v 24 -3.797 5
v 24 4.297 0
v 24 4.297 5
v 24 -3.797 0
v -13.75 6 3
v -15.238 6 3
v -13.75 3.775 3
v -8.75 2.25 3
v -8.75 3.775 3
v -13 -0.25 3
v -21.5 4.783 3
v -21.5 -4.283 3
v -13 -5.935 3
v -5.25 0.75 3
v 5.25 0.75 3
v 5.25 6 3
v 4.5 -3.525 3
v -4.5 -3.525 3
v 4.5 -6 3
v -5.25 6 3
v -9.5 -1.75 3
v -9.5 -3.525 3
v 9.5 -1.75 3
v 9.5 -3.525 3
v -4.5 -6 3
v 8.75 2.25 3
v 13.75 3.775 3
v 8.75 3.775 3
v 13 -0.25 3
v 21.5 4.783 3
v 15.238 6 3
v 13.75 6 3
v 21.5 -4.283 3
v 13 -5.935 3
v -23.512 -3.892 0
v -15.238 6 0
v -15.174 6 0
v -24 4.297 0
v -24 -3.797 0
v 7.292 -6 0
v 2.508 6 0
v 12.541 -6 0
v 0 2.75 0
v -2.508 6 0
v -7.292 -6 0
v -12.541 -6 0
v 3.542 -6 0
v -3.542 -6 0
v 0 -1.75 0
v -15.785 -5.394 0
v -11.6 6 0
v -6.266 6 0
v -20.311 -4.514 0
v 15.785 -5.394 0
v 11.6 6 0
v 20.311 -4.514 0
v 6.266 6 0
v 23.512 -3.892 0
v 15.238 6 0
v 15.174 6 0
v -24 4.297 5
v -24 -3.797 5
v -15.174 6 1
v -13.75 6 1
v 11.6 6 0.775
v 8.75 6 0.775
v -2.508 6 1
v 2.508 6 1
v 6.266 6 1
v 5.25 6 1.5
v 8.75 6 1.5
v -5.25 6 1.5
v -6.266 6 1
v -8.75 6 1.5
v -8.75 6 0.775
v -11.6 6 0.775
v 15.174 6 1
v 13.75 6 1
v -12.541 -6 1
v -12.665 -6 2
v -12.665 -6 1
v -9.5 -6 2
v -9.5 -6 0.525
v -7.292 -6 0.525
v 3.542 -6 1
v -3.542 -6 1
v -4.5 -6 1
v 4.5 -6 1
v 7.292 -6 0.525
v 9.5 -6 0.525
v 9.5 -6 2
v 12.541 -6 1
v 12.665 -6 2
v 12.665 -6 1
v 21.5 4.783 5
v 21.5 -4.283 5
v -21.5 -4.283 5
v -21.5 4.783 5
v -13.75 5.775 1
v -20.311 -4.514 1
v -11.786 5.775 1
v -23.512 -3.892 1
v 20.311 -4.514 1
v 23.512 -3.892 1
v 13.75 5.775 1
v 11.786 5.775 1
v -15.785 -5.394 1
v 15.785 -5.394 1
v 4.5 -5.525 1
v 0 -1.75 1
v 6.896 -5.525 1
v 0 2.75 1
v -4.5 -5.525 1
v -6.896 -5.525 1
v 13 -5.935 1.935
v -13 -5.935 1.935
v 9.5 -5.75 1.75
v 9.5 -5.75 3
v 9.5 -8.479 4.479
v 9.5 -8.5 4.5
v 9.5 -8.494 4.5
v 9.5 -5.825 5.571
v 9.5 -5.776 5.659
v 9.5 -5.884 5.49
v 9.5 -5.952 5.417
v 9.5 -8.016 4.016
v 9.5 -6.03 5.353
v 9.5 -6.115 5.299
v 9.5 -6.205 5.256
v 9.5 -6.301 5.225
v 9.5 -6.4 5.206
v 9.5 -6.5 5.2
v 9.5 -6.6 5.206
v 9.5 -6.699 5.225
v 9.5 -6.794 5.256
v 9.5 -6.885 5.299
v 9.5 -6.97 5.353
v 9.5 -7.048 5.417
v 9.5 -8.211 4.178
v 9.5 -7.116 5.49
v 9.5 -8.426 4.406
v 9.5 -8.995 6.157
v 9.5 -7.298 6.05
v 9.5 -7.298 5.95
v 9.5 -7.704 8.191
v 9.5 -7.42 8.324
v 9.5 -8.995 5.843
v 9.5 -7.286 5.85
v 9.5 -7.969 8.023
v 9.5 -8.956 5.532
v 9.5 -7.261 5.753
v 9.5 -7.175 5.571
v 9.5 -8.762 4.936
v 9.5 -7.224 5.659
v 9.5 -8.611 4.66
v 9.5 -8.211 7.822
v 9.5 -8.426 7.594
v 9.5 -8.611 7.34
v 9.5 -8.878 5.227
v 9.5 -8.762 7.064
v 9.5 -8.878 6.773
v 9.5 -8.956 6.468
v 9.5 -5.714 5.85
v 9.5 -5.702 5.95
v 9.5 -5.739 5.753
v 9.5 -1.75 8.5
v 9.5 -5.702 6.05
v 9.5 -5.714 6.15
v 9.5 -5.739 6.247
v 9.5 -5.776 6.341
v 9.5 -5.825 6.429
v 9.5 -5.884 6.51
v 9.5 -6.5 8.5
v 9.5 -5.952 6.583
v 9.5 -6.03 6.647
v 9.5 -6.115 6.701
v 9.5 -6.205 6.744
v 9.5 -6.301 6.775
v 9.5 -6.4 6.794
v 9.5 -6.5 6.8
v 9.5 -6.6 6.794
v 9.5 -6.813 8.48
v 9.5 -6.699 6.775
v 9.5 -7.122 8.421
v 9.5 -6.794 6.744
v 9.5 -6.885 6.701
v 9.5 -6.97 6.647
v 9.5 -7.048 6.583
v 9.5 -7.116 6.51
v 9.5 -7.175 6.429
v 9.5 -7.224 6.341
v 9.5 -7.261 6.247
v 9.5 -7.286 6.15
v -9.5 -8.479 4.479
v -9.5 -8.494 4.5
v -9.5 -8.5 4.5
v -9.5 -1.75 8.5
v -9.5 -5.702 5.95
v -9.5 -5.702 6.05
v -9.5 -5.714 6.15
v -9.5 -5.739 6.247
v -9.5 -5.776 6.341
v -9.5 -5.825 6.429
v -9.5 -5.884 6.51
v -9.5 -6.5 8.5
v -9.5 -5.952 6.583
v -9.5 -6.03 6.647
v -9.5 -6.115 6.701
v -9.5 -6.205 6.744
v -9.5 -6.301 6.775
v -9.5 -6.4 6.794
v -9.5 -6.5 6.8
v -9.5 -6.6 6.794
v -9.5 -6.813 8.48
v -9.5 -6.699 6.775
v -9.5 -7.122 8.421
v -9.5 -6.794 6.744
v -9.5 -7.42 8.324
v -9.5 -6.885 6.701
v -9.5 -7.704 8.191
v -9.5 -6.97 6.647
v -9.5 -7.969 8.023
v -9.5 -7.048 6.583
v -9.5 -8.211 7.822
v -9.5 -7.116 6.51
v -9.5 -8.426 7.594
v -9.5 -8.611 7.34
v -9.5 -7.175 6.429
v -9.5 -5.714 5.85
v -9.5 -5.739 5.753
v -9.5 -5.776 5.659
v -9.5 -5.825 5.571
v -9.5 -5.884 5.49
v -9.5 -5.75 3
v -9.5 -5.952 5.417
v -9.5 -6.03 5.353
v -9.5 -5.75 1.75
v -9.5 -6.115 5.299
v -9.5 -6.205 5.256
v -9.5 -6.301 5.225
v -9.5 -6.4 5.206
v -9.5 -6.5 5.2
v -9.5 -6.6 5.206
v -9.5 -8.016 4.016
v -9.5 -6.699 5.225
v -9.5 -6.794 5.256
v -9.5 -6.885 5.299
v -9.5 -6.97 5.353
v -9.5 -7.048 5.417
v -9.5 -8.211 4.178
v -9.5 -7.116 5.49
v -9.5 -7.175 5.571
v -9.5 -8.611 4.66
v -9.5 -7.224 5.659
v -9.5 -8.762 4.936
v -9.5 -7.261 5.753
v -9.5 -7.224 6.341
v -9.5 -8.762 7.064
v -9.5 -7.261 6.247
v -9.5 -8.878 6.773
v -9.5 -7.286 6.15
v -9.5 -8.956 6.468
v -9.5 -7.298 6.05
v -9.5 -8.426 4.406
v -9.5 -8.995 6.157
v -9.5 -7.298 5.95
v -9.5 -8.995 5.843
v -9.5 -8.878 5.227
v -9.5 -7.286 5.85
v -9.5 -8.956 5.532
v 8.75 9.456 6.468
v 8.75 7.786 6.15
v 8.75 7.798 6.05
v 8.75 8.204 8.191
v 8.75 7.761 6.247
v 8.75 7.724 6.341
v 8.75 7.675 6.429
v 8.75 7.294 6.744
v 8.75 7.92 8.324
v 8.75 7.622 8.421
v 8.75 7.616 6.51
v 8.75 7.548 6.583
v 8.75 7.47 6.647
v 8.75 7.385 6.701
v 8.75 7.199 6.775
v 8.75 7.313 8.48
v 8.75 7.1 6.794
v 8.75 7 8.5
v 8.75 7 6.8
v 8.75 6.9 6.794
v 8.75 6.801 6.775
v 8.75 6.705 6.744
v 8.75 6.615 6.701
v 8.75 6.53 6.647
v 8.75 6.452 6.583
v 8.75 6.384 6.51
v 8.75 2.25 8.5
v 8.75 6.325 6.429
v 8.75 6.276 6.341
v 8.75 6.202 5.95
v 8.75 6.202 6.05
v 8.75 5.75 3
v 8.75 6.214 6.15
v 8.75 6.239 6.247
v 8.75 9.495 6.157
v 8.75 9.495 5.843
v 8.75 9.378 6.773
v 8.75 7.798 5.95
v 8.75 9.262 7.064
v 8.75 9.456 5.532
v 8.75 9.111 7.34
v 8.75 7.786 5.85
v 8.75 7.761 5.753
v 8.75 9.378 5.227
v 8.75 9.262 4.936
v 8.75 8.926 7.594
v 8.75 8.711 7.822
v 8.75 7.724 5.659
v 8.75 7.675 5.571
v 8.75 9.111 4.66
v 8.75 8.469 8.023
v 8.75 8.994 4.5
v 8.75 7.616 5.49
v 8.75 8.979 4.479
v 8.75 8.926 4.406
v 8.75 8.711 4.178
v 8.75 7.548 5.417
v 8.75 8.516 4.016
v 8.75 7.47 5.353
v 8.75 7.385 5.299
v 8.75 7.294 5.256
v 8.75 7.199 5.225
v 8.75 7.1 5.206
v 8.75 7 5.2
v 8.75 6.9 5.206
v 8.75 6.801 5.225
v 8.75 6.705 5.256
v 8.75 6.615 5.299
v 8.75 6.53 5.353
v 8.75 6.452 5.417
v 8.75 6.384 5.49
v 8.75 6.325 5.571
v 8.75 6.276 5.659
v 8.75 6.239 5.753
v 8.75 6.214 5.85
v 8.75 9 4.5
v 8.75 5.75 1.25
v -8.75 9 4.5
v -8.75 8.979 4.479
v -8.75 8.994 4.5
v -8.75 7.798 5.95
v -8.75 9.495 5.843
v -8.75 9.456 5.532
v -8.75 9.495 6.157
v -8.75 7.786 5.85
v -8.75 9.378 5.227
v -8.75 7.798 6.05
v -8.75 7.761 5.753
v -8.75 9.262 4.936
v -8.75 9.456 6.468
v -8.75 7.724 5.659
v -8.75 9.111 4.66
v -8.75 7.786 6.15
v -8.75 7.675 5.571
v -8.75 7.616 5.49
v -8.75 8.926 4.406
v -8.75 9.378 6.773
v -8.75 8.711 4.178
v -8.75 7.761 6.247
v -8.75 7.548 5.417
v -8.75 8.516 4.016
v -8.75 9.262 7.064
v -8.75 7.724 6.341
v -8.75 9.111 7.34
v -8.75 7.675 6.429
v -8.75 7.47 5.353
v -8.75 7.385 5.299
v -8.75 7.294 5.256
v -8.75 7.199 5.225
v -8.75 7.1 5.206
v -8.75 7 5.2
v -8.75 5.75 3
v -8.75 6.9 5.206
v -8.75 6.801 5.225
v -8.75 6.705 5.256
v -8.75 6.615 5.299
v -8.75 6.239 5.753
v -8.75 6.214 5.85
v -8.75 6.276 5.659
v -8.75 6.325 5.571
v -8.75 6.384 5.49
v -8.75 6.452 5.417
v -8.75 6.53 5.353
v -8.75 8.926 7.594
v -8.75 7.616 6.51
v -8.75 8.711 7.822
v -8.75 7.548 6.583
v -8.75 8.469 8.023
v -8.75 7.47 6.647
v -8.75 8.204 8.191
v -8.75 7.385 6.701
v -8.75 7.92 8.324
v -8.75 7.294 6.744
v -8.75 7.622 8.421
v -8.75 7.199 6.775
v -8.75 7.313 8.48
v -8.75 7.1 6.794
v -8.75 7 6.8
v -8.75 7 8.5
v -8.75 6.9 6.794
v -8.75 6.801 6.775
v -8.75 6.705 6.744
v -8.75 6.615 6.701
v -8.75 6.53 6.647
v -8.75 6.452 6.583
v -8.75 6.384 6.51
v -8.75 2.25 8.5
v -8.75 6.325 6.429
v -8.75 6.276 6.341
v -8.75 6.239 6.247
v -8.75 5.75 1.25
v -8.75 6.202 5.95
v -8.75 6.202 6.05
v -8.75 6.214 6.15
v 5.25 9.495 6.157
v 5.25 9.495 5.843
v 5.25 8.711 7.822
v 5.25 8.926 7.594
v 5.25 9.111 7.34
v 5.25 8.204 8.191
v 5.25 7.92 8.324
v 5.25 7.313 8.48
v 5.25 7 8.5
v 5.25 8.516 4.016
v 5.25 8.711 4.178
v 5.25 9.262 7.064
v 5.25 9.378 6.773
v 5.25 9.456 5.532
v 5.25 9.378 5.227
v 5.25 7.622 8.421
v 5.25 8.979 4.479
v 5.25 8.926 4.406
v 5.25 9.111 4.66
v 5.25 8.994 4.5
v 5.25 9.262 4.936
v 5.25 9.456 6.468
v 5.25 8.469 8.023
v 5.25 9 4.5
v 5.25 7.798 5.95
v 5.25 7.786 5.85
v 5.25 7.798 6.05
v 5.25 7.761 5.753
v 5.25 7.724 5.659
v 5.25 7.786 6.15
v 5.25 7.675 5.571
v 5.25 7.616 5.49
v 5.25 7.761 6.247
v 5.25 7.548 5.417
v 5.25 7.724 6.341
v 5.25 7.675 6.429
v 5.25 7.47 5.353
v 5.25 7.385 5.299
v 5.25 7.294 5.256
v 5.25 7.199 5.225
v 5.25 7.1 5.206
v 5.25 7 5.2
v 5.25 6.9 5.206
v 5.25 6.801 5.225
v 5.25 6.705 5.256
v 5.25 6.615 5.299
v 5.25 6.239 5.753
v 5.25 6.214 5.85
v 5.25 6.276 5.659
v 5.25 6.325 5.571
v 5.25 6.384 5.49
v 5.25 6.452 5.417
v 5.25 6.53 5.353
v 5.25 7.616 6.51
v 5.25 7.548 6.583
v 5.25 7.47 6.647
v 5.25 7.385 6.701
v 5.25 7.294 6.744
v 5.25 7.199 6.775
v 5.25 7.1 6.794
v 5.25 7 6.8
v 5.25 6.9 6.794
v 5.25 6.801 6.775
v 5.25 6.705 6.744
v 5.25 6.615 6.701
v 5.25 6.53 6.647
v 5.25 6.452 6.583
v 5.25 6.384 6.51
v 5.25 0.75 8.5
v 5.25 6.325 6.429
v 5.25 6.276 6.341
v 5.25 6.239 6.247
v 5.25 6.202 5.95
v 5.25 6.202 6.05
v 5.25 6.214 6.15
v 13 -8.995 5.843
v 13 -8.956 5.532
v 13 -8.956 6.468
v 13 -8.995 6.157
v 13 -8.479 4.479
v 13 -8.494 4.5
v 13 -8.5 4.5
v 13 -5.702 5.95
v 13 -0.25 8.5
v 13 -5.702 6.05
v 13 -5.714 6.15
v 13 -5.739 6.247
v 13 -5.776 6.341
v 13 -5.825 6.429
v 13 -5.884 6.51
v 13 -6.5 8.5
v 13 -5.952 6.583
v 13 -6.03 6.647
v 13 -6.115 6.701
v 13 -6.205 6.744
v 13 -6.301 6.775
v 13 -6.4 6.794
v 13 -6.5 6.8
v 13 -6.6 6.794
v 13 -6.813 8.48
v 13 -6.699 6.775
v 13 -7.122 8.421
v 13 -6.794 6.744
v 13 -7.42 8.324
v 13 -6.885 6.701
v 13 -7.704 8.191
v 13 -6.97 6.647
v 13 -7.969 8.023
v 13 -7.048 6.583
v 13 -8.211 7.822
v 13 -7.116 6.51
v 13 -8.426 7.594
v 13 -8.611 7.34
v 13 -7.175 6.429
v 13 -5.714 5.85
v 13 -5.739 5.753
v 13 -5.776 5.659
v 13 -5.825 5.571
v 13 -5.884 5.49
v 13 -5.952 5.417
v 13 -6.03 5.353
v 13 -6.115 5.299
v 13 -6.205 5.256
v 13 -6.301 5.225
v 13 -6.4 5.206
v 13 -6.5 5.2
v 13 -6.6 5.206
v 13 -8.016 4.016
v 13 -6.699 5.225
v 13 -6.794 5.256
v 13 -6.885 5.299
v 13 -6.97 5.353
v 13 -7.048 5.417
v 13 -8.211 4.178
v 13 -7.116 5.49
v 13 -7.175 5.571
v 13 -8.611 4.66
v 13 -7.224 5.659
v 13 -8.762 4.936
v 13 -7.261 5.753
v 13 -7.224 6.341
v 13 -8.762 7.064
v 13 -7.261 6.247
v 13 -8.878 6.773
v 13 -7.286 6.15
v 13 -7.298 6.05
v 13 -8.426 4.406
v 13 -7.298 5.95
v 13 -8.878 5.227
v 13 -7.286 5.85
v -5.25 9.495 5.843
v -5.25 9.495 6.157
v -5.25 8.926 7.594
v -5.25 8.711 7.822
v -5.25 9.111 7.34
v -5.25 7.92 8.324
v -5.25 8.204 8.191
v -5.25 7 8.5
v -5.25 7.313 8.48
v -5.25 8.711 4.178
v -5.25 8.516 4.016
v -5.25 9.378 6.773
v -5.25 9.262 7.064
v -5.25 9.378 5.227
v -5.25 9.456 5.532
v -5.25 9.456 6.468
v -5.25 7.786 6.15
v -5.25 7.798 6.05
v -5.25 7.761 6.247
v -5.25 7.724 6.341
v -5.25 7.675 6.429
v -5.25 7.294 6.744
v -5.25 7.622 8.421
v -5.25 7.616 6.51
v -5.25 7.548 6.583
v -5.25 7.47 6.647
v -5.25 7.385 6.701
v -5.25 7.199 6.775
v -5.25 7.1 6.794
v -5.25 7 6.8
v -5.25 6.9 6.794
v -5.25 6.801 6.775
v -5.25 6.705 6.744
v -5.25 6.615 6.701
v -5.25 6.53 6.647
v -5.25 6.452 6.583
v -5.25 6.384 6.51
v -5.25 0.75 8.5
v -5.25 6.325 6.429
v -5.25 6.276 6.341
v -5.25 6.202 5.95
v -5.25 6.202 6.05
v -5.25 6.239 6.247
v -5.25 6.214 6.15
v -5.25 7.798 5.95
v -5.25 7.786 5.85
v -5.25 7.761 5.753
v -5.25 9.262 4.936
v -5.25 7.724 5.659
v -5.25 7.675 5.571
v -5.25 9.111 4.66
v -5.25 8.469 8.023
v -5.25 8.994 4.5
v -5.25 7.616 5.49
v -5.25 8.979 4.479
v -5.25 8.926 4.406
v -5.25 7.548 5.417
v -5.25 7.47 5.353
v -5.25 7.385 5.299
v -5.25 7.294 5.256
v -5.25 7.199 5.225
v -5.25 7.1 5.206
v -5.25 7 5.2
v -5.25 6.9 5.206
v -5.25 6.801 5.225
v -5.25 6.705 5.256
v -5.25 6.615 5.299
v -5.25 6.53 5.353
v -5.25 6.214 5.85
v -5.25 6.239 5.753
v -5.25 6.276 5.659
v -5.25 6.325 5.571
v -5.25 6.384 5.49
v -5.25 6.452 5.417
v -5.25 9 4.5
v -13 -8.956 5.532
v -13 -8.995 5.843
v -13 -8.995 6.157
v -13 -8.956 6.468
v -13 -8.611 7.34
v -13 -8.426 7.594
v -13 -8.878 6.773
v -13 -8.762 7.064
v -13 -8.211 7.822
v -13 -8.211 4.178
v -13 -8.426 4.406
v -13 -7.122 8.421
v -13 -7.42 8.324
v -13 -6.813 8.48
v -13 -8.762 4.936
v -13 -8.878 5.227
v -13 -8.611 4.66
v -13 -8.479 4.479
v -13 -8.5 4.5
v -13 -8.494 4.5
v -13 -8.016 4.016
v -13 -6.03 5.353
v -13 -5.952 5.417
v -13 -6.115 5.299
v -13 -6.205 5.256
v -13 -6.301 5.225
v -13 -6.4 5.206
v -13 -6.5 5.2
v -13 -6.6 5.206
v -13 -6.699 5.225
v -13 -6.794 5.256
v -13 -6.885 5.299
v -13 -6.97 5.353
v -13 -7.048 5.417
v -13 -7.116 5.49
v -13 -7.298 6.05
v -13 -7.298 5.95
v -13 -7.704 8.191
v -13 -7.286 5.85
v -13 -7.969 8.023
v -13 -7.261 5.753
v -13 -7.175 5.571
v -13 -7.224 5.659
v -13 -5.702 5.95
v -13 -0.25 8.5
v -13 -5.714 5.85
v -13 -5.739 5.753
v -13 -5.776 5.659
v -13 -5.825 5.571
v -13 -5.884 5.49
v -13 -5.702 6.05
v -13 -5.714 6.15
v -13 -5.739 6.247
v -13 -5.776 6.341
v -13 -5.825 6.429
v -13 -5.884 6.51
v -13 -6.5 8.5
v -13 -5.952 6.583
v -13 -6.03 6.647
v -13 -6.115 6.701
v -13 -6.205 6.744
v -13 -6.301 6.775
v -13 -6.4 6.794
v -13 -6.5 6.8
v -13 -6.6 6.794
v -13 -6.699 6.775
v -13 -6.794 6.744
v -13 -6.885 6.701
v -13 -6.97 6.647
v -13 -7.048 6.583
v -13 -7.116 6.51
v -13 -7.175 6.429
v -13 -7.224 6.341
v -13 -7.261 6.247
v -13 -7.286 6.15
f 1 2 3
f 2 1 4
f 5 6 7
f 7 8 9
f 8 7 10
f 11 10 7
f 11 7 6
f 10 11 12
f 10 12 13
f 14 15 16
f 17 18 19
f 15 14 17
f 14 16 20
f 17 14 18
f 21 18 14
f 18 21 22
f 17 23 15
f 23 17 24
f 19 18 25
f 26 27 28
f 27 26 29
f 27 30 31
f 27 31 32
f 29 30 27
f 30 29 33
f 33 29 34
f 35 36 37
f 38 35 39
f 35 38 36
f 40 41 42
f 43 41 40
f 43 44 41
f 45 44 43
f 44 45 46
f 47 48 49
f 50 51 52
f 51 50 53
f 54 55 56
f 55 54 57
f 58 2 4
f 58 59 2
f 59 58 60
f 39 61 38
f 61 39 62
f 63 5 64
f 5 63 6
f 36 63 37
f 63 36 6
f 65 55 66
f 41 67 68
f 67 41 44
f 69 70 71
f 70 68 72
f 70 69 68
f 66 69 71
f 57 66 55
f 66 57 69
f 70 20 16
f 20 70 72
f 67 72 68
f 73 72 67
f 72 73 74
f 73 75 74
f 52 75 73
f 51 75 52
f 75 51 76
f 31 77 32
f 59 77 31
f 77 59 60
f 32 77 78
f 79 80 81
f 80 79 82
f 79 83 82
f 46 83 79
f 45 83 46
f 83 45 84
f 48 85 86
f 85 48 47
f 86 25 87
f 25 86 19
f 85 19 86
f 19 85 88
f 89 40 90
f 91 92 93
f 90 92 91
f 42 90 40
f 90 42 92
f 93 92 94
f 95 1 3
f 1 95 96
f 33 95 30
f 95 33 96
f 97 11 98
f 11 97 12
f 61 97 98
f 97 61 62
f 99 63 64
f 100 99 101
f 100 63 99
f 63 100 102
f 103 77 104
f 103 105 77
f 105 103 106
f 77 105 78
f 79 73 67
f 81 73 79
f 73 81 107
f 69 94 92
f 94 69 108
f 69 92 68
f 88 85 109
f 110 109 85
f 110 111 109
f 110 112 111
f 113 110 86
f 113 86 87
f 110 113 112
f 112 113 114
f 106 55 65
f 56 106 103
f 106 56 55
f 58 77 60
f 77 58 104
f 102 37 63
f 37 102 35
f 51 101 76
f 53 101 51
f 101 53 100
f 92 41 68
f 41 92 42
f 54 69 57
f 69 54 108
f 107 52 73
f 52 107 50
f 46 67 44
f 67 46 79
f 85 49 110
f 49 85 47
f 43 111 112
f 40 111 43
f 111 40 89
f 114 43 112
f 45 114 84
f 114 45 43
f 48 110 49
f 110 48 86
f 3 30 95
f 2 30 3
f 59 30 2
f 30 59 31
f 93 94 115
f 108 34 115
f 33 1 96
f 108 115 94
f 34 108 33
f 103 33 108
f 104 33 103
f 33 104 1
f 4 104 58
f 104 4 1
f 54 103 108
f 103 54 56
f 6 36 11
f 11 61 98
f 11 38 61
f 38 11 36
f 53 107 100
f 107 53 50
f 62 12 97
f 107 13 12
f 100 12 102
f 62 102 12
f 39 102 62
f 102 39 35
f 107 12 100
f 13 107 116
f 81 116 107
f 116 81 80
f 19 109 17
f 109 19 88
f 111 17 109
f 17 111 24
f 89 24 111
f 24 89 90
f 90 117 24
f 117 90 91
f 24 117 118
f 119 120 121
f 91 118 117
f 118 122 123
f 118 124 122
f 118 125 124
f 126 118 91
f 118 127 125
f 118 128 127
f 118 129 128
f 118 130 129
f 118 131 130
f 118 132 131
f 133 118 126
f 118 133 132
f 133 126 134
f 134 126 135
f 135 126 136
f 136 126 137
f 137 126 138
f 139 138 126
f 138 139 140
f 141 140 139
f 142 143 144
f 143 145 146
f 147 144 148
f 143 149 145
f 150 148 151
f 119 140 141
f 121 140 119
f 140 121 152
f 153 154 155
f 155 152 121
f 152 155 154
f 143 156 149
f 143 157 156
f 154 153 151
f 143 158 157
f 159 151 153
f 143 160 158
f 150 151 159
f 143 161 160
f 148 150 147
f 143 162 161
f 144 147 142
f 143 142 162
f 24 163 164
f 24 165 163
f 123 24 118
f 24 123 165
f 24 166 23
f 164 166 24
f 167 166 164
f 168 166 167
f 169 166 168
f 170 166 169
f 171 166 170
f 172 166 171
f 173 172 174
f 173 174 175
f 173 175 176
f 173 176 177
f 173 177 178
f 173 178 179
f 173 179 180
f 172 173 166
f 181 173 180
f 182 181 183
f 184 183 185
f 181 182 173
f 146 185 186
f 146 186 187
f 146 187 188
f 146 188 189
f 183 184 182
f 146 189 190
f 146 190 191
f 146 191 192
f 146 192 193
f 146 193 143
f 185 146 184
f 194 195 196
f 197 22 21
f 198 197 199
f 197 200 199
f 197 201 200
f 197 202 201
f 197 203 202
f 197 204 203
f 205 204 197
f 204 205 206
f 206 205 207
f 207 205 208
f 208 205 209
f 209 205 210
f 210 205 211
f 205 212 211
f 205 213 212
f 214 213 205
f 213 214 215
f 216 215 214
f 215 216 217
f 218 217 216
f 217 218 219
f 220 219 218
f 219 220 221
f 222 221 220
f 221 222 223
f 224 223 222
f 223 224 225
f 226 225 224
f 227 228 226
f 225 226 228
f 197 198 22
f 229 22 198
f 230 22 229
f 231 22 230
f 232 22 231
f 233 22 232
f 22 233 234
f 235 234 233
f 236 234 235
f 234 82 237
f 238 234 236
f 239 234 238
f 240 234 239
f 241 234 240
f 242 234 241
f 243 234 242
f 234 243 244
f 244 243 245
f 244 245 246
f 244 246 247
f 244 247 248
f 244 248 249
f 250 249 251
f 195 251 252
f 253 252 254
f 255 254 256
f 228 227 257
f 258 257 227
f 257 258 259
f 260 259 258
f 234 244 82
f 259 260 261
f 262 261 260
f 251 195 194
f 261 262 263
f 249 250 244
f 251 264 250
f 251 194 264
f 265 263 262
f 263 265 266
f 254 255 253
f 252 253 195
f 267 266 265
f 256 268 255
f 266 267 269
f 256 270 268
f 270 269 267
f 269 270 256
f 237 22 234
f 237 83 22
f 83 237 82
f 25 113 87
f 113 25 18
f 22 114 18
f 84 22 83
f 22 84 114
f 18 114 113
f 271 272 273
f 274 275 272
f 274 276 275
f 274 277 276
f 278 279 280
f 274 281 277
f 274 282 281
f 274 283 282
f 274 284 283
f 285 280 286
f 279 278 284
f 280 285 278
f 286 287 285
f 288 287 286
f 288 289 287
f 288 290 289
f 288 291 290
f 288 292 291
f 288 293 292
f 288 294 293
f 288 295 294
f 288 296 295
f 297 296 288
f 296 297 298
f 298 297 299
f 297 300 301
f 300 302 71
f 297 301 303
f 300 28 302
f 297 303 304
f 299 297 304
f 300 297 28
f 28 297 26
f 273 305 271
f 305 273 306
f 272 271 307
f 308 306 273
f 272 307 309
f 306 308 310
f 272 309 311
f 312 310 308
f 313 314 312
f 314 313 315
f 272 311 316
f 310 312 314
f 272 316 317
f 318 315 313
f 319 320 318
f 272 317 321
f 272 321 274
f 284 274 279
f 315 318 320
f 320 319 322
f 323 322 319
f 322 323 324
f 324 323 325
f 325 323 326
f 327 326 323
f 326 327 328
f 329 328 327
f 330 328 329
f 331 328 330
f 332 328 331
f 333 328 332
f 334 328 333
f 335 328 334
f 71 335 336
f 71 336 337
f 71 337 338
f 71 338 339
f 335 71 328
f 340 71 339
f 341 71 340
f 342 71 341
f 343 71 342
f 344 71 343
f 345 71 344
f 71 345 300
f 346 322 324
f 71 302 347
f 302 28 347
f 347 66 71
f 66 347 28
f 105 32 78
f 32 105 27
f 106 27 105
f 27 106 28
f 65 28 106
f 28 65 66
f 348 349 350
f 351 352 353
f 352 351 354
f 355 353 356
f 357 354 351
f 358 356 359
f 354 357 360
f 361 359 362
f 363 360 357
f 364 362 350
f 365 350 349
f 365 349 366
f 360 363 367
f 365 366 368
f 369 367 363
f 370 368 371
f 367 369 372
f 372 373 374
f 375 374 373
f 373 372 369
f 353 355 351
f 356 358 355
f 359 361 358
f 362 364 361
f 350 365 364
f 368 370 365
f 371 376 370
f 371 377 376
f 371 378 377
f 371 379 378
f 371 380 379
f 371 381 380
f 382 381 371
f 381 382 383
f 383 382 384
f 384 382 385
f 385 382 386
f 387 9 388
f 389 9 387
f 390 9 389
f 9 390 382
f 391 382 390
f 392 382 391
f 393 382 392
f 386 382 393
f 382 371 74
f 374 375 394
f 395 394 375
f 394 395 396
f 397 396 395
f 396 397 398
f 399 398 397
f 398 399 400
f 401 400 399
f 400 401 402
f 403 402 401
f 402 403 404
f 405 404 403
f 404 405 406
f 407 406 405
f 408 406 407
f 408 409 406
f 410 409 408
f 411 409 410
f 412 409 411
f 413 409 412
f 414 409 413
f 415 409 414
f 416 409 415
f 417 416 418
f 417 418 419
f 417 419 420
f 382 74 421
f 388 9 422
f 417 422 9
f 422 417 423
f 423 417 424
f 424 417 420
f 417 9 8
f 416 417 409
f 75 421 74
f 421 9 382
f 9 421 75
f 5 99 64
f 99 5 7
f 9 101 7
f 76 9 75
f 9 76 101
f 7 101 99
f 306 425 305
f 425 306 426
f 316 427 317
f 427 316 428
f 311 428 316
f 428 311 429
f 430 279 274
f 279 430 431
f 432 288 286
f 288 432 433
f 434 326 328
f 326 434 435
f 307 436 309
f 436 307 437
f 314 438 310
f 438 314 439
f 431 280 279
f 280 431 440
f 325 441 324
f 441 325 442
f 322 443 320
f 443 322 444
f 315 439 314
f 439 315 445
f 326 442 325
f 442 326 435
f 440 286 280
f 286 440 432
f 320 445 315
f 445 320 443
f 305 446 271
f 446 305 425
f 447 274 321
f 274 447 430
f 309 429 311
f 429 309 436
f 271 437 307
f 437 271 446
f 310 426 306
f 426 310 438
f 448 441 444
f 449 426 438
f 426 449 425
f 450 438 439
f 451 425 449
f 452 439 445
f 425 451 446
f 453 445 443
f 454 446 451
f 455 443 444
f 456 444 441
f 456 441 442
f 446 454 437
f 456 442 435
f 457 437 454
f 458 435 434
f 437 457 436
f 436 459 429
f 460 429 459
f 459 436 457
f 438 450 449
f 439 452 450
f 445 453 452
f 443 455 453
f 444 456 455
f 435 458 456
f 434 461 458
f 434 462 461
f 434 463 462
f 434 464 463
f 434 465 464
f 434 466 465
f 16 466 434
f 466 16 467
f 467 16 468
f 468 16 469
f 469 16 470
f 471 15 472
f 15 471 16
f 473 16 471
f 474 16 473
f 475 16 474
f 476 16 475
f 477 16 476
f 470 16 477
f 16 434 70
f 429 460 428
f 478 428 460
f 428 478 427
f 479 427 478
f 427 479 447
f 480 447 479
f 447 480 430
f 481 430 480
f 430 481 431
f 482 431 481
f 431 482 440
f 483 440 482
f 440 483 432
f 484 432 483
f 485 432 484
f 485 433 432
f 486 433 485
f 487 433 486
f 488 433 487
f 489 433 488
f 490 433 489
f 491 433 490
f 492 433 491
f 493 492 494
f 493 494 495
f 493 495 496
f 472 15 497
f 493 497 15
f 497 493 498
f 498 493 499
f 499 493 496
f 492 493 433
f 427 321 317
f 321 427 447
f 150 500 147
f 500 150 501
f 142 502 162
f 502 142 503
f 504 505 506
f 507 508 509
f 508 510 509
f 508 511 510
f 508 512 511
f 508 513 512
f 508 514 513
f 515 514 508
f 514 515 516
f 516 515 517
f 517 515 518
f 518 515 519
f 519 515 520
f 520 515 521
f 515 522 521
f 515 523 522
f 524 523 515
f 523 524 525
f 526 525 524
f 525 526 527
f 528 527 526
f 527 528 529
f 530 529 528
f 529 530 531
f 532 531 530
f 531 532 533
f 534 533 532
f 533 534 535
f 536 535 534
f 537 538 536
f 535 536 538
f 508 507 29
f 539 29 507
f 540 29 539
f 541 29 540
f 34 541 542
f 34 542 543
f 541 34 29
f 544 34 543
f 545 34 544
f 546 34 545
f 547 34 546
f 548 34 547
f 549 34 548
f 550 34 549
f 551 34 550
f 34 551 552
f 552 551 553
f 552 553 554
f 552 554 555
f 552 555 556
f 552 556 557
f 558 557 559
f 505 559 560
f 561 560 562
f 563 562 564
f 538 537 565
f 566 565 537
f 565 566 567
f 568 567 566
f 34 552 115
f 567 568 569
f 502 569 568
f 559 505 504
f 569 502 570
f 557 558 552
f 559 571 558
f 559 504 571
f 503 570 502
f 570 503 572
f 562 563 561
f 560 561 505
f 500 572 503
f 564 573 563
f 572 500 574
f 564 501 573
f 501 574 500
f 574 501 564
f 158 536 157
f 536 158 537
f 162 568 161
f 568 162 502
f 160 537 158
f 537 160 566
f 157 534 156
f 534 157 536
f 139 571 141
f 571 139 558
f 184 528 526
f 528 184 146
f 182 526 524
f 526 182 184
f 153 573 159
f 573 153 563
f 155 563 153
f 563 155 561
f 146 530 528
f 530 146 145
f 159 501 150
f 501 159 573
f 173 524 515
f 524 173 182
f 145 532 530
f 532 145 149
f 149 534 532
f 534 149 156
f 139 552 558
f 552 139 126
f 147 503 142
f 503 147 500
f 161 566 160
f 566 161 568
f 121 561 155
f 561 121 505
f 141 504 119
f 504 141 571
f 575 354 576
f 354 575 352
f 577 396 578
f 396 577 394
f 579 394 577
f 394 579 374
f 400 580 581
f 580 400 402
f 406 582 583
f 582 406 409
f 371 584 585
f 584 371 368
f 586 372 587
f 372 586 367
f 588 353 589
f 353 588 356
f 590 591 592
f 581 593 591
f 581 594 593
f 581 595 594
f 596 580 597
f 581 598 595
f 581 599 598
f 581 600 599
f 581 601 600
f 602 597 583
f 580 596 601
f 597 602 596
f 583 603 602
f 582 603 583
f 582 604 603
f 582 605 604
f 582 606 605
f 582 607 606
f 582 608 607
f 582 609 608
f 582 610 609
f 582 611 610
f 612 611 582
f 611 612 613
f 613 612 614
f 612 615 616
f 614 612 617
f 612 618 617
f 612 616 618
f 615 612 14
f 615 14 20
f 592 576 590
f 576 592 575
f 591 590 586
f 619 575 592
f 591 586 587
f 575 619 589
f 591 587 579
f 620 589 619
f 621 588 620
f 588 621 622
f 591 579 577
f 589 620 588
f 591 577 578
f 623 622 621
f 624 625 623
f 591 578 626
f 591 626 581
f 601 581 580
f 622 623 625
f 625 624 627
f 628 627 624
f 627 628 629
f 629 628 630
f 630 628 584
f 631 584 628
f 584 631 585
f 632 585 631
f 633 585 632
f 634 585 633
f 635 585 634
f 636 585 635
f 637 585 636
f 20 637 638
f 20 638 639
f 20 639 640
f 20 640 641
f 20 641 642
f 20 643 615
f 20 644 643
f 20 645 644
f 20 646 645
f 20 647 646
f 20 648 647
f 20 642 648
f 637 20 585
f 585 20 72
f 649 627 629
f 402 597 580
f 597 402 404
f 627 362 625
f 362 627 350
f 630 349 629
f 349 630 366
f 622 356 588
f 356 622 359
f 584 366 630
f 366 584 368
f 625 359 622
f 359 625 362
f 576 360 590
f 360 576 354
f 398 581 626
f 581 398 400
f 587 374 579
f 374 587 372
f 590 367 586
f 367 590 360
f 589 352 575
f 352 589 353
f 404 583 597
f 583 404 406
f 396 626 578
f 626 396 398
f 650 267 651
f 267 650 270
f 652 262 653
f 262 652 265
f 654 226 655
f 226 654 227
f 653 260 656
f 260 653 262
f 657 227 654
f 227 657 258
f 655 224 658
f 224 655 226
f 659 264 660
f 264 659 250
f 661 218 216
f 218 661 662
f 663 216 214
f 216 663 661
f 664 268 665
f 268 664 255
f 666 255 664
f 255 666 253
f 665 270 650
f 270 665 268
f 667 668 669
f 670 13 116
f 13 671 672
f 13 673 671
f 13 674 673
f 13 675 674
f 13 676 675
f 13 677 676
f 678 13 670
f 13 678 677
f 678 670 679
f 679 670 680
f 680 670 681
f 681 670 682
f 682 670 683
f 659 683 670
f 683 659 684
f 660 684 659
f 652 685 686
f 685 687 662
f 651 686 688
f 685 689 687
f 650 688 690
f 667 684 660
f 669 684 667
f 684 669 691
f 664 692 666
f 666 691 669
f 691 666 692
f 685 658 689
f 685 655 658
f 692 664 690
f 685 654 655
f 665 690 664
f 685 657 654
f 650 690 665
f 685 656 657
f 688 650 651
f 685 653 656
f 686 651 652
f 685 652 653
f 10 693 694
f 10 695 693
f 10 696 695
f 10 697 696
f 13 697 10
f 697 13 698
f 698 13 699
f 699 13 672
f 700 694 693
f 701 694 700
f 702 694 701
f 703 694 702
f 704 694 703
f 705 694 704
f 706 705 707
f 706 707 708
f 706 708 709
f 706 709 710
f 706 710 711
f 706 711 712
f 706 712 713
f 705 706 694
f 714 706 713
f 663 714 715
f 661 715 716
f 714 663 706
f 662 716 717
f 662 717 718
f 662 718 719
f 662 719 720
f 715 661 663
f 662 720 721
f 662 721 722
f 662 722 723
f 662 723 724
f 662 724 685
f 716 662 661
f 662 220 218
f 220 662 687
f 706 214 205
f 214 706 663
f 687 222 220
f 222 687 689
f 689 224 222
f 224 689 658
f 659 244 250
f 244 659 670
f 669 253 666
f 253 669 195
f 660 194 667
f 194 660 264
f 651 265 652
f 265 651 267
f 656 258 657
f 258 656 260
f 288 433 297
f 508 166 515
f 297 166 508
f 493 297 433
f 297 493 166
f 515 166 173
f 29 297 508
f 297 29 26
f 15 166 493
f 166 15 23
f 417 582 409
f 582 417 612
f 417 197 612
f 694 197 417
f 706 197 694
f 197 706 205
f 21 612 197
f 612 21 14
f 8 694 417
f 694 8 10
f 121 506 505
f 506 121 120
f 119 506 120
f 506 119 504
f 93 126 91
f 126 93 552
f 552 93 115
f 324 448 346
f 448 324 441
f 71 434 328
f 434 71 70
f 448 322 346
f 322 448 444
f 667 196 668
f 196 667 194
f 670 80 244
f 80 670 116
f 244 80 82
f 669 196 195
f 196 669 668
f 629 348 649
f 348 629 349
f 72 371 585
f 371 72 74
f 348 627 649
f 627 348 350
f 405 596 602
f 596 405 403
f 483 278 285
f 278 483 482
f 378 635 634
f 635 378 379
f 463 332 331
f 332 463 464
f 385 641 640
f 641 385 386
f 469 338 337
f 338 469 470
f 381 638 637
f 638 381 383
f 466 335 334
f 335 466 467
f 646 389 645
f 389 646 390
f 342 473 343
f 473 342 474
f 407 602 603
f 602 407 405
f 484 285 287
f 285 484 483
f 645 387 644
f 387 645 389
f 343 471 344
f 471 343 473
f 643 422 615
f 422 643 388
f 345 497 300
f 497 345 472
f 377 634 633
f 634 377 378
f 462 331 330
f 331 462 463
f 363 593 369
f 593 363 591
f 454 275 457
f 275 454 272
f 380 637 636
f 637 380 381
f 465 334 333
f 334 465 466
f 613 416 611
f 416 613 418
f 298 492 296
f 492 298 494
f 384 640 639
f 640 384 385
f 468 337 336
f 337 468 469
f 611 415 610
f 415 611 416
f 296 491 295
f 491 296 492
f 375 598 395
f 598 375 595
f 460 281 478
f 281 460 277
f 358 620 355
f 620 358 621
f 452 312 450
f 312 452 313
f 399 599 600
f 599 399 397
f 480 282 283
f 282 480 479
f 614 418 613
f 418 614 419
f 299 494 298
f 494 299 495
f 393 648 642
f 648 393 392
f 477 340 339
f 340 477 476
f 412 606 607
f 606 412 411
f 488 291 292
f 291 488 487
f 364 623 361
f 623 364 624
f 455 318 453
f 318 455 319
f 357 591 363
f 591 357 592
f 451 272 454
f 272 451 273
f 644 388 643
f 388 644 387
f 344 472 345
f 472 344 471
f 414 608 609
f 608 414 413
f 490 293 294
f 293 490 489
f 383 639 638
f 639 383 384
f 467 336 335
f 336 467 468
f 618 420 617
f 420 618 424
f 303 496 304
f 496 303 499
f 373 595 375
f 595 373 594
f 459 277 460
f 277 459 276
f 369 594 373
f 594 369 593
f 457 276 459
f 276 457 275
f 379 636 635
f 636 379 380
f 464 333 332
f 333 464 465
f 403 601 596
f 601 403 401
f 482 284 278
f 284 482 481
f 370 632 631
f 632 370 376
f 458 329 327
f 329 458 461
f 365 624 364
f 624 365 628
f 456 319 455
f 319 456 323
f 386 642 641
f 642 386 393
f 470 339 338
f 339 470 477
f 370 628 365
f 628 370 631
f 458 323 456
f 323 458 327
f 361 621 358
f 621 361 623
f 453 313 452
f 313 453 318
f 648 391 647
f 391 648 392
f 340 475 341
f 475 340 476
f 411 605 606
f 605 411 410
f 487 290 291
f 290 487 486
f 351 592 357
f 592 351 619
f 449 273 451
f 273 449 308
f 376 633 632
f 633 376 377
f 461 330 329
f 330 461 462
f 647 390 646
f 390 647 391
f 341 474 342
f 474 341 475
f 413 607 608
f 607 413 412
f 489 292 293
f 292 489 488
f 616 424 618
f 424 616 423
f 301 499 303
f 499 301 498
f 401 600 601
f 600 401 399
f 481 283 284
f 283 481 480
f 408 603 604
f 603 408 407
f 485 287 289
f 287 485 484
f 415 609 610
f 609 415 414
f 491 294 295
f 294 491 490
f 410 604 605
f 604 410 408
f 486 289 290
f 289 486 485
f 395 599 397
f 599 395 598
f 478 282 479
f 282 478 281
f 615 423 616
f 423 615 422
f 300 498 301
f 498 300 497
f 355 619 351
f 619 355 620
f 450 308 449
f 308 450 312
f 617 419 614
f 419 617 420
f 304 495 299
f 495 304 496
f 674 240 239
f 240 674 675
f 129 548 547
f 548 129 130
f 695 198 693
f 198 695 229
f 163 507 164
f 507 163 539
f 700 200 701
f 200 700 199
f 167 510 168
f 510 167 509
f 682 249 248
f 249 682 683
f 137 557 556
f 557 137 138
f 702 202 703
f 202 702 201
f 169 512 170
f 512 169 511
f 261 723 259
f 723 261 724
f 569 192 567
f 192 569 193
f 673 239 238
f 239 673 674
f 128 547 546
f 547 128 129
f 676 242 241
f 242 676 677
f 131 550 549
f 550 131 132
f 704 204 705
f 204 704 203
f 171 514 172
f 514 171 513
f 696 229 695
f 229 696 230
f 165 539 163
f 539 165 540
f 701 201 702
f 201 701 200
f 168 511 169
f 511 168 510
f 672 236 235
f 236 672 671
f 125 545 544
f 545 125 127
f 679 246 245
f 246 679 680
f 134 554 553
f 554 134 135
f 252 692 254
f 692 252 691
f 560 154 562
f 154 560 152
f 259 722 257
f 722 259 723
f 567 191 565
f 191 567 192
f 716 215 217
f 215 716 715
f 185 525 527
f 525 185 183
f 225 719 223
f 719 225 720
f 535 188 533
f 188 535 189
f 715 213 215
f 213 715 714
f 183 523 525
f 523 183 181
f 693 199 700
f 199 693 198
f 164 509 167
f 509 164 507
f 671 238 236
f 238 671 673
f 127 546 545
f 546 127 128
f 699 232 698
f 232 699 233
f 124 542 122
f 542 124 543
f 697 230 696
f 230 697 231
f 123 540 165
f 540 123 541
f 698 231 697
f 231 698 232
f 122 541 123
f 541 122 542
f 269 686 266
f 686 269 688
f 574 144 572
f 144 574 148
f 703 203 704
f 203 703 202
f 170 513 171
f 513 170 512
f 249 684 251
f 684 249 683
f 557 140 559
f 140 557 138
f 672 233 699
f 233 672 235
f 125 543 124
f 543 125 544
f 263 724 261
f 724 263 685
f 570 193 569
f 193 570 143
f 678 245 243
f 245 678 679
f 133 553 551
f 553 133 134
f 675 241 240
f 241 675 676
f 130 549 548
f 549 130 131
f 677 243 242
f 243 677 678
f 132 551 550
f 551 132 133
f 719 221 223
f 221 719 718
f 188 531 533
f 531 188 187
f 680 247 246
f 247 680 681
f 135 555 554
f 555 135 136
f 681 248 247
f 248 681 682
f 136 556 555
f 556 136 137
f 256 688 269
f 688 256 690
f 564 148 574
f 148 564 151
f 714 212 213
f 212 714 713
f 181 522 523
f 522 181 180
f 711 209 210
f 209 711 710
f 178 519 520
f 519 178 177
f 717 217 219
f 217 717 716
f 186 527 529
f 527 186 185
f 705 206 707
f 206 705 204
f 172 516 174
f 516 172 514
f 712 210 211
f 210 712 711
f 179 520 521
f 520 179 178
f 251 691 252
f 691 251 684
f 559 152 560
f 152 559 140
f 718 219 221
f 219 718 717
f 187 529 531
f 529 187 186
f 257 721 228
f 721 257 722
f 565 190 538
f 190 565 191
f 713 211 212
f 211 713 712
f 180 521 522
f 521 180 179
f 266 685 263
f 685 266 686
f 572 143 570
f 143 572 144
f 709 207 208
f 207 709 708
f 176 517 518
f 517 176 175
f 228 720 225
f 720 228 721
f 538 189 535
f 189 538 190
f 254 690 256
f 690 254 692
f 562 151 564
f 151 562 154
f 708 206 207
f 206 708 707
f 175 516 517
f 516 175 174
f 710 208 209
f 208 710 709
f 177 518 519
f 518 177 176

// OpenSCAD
//translate([-24,-9,0]) #import("tread.stl");
difference() {
union () {
difference() {
union() {
//Main foot
translate([0,0,1.5]) cube([48,12,3],center=true);
//lips
translate([22.75,0,4]) cube([2.5,12,2],center=true);
translate([-22.75,0,4]) cube([2.5,12,2],center=true);
}
translate([0,0,-0.5])linear_extrude(height=1.5) {
//Track pattern
polygon(points=[[-7.5,-6.25],[0,2.75],[7.5,-6.25],[3.75,-6.25],[0,-1.75],[-3.75,-6.25]]);
polygon(points=[[-16.5,-6.25],[0,13.5],[16.5,-6.25],[12.75,-6.25],[0,9],[-12.75,-6.25]]);
polygon(points=[[-25.5,-6.25],[0,24],[25.5,-6.25],[21.75,-6.25],[0,20],[-21.75,-6.25]]);
}
//Edge cuttings from track
//offset by 0.5 for offset
translate([28,18.8,0]) rotate(79) cube([30,30,20],center=true);
translate([28,-18.3,0]) rotate(-79) cube([30,30,20],center=true);
translate([-28,18.8,0]) rotate(-79) cube([30,30,20],center=true);
translate([-28,-18.3,0]) rotate(79) cube([30,30,20],center=true);
//trackway remove
translate([7,-6,3])rotate([45,0,0]) cube([5,3.5,3.5],center=true);
translate([-7,-6,3])rotate([45,0,0]) cube([5,3.5,3.5],center=true);
translate([11.25,6.25,3])rotate([45,0,0]) cube([5,3.5,3.5],center=true);
translate([-11.25,6.25,3])rotate([45,0,0]) cube([5,3.5,3.5],center=true);
}
//pin grabs
translate([7,7,6]) rotate([0,90,0]) cylinder(r=2.5,h=3.5,center=true);
translate([11.25,-6.5,6]) rotate([0,90,0]) cylinder(r=2.5,h=3.5,center=true);
translate([-7,7,6]) rotate([0,90,0]) cylinder(r=2.5,h=3.5,center=true);
translate([-11.25,-6.5,6]) rotate([0,90,0]) cylinder(r=2.5,h=3.5,center=true);
//rails
translate([0,0,3]) linear_extrude(height=5.5)
polygon(points=[[13,-6.5],[13,-0.25],[8.75,2.25],[8.75,7],[5.25,7],[5.25,0.75],[9.5,-1.75],[9.5,-6.5]]);
translate([0,0,3]) linear_extrude(height=5.5)
polygon(points=[[-13,-6.5],[-13,-0.25],[-8.75,2.25],[-8.75,7],[-5.25,7],[-5.25,0.75],[-9.5,-1.75],[-9.5,-6.5]]);
//Join sections
translate([9.5,-5.75,1.75]) rotate([0,90,0]) linear_extrude(height=3.5)
polygon(points=[[0,0],[-2.75,-2.75],[-2.75,0]]);
translate([5.25,6.25,1.75]) rotate([0,90,0]) linear_extrude(height=3.5)
polygon(points=[[0.5,-0.5],[-2.75,2.75],[-2.75,-0.5]]);
translate([-13,-5.75,1.75]) rotate([0,90,0]) linear_extrude(height=3.5)
polygon(points=[[0,0],[-2.75,-2.75],[-2.75,0]]);
translate([-8.75,6.25,1.75]) rotate([0,90,0]) linear_extrude(height=3.5)
polygon(points=[[0.5,-0.5],[-2.75,2.75],[-2.75,-0.5]]);
}
//pins
translate([0,7,6]) rotate([0,90,0]) cylinder(r=0.8,h=50,center=true);
translate([0,-6.5,6]) rotate([0,90,0]) cylinder(r=0.8,h=50,center=true);
}


$fn=50;
